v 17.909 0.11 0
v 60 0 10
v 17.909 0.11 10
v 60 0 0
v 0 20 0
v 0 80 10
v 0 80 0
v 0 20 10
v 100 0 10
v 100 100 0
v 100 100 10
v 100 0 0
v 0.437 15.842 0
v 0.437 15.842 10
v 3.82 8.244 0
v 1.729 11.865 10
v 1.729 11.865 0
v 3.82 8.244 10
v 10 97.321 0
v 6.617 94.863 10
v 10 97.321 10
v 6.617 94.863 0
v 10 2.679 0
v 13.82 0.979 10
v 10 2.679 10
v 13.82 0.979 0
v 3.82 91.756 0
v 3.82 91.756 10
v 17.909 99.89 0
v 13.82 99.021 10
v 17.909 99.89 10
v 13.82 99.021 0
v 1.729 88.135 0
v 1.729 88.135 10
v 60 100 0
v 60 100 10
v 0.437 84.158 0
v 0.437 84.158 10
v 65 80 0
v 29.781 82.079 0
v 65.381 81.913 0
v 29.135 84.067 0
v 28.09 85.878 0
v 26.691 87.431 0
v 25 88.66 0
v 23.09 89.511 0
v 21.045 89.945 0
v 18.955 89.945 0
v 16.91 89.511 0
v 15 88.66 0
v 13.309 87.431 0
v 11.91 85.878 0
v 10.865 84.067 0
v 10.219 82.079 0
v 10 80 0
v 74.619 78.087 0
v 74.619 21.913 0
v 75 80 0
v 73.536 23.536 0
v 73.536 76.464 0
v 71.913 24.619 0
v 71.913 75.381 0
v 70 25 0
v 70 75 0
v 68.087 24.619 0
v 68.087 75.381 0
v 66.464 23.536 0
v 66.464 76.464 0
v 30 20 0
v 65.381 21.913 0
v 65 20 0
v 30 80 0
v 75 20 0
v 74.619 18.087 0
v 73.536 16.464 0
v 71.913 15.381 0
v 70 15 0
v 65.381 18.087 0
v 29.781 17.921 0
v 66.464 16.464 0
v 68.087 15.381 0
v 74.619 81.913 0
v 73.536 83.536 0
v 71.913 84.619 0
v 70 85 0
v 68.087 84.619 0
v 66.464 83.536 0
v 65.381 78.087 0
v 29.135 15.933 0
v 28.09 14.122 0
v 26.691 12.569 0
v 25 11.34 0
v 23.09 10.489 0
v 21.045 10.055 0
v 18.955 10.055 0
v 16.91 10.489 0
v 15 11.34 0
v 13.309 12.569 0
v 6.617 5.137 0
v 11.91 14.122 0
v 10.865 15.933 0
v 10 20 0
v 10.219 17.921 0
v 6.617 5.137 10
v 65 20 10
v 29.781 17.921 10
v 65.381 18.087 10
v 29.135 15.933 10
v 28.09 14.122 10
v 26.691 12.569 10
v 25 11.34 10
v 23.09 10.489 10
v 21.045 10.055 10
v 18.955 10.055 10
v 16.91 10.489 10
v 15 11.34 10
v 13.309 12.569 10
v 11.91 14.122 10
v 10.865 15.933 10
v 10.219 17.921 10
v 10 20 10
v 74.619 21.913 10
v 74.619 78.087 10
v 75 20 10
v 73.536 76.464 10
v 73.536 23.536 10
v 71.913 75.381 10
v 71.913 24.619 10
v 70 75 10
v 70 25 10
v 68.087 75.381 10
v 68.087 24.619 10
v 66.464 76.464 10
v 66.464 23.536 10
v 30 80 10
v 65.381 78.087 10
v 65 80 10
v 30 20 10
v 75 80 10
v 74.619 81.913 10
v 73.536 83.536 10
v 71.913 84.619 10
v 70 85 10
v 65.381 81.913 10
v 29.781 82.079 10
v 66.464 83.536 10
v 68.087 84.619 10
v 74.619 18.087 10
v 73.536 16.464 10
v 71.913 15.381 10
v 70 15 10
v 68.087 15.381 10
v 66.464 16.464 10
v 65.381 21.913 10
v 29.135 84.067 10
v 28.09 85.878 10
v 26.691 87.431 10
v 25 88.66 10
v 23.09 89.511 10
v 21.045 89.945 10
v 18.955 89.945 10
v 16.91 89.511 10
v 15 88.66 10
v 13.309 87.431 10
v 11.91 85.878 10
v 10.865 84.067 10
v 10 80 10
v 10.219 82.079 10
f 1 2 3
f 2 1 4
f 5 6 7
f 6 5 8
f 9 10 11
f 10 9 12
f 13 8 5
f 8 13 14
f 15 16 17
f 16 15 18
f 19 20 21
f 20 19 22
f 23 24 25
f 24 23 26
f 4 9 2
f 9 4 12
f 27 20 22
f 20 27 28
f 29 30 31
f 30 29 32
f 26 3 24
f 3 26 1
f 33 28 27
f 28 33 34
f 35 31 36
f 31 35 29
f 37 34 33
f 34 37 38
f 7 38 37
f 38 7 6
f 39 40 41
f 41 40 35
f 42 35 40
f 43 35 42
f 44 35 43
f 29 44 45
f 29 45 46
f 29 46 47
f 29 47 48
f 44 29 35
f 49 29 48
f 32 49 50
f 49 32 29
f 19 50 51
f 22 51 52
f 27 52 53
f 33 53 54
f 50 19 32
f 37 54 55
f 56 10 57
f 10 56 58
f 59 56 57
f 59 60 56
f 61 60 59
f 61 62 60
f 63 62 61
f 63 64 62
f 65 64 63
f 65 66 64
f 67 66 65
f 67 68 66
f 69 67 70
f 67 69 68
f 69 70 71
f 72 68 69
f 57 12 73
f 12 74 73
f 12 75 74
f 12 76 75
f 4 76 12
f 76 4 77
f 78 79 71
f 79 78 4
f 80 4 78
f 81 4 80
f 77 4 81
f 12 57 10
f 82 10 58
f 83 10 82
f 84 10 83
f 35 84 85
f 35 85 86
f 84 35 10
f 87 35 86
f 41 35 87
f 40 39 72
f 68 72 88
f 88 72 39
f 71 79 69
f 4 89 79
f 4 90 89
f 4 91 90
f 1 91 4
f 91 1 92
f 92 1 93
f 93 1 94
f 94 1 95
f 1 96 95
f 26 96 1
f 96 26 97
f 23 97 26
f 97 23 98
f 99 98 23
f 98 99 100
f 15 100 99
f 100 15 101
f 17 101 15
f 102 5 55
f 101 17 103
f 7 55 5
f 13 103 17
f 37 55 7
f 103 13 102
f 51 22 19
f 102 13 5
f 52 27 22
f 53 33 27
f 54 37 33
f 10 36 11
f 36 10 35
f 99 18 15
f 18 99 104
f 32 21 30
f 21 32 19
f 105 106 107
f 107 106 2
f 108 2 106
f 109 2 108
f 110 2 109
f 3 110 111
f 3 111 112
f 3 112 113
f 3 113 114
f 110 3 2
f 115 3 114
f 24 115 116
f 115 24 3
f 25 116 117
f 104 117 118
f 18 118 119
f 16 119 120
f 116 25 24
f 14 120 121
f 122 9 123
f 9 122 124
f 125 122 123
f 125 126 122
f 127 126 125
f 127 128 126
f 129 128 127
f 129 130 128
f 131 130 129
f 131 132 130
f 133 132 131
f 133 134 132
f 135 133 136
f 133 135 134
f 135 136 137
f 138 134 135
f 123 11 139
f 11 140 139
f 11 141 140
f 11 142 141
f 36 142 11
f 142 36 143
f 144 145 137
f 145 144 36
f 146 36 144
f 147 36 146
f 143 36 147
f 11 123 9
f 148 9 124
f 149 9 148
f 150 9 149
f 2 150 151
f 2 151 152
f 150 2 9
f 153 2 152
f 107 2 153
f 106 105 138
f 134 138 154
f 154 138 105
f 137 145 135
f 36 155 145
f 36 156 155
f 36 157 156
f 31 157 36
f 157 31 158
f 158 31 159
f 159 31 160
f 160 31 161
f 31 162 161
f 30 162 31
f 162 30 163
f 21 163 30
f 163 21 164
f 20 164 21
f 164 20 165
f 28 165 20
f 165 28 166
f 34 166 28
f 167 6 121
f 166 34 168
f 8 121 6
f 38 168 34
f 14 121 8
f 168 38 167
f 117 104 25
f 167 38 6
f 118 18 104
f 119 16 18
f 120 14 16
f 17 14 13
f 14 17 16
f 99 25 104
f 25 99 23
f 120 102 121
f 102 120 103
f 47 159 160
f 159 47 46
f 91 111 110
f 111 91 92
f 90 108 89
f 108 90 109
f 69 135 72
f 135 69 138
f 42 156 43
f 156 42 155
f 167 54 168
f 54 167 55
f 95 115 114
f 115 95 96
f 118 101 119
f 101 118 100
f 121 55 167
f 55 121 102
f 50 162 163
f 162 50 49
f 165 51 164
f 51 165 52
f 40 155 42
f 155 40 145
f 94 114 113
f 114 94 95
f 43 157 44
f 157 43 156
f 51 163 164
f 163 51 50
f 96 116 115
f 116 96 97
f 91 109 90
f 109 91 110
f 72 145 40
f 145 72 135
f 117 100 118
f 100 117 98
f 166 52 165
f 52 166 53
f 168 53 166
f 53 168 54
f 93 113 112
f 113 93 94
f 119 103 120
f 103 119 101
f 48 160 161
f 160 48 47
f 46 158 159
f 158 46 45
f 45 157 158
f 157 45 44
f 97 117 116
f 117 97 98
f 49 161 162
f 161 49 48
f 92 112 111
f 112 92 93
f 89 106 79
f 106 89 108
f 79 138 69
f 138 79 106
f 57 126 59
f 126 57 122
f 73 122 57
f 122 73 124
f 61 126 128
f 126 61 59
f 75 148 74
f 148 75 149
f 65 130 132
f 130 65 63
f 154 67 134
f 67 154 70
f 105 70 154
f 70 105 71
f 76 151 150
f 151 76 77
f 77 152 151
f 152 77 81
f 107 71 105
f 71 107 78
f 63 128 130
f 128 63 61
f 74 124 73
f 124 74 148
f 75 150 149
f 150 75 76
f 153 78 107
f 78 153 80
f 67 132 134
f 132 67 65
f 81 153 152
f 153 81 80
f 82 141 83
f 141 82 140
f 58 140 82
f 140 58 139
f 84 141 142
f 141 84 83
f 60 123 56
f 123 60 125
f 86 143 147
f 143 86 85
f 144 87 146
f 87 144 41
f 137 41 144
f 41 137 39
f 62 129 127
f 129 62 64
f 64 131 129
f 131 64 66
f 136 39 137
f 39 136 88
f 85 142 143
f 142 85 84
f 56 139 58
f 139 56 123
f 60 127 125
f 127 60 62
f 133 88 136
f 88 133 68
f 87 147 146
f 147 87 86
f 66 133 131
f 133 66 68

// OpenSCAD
// test with hull
difference() {
// main body
  hull() {
    translate([20,20,0])
    cylinder(h=10,r=20,center=false);
    translate([60,0,0])
    cube([40,40,10]);
    translate([20,80,0])
    cylinder(h=10,r=20,center=false);
    translate([60,60,0])
    cube([40,40,10]);
  }
// rounded slit
  hull() {
    translate([20,20,0])
    cylinder(h=10,r=10,center=false);
    translate([20,80,0])
    cylinder(h=10,r=10,center=false);
  }
// hole 1
  translate([70,20,5])
  cylinder(h=10,r=5,center=true);
// hole 2 
  translate([70,80,5])
  cylinder(h=10,r=5,center=true);
}
